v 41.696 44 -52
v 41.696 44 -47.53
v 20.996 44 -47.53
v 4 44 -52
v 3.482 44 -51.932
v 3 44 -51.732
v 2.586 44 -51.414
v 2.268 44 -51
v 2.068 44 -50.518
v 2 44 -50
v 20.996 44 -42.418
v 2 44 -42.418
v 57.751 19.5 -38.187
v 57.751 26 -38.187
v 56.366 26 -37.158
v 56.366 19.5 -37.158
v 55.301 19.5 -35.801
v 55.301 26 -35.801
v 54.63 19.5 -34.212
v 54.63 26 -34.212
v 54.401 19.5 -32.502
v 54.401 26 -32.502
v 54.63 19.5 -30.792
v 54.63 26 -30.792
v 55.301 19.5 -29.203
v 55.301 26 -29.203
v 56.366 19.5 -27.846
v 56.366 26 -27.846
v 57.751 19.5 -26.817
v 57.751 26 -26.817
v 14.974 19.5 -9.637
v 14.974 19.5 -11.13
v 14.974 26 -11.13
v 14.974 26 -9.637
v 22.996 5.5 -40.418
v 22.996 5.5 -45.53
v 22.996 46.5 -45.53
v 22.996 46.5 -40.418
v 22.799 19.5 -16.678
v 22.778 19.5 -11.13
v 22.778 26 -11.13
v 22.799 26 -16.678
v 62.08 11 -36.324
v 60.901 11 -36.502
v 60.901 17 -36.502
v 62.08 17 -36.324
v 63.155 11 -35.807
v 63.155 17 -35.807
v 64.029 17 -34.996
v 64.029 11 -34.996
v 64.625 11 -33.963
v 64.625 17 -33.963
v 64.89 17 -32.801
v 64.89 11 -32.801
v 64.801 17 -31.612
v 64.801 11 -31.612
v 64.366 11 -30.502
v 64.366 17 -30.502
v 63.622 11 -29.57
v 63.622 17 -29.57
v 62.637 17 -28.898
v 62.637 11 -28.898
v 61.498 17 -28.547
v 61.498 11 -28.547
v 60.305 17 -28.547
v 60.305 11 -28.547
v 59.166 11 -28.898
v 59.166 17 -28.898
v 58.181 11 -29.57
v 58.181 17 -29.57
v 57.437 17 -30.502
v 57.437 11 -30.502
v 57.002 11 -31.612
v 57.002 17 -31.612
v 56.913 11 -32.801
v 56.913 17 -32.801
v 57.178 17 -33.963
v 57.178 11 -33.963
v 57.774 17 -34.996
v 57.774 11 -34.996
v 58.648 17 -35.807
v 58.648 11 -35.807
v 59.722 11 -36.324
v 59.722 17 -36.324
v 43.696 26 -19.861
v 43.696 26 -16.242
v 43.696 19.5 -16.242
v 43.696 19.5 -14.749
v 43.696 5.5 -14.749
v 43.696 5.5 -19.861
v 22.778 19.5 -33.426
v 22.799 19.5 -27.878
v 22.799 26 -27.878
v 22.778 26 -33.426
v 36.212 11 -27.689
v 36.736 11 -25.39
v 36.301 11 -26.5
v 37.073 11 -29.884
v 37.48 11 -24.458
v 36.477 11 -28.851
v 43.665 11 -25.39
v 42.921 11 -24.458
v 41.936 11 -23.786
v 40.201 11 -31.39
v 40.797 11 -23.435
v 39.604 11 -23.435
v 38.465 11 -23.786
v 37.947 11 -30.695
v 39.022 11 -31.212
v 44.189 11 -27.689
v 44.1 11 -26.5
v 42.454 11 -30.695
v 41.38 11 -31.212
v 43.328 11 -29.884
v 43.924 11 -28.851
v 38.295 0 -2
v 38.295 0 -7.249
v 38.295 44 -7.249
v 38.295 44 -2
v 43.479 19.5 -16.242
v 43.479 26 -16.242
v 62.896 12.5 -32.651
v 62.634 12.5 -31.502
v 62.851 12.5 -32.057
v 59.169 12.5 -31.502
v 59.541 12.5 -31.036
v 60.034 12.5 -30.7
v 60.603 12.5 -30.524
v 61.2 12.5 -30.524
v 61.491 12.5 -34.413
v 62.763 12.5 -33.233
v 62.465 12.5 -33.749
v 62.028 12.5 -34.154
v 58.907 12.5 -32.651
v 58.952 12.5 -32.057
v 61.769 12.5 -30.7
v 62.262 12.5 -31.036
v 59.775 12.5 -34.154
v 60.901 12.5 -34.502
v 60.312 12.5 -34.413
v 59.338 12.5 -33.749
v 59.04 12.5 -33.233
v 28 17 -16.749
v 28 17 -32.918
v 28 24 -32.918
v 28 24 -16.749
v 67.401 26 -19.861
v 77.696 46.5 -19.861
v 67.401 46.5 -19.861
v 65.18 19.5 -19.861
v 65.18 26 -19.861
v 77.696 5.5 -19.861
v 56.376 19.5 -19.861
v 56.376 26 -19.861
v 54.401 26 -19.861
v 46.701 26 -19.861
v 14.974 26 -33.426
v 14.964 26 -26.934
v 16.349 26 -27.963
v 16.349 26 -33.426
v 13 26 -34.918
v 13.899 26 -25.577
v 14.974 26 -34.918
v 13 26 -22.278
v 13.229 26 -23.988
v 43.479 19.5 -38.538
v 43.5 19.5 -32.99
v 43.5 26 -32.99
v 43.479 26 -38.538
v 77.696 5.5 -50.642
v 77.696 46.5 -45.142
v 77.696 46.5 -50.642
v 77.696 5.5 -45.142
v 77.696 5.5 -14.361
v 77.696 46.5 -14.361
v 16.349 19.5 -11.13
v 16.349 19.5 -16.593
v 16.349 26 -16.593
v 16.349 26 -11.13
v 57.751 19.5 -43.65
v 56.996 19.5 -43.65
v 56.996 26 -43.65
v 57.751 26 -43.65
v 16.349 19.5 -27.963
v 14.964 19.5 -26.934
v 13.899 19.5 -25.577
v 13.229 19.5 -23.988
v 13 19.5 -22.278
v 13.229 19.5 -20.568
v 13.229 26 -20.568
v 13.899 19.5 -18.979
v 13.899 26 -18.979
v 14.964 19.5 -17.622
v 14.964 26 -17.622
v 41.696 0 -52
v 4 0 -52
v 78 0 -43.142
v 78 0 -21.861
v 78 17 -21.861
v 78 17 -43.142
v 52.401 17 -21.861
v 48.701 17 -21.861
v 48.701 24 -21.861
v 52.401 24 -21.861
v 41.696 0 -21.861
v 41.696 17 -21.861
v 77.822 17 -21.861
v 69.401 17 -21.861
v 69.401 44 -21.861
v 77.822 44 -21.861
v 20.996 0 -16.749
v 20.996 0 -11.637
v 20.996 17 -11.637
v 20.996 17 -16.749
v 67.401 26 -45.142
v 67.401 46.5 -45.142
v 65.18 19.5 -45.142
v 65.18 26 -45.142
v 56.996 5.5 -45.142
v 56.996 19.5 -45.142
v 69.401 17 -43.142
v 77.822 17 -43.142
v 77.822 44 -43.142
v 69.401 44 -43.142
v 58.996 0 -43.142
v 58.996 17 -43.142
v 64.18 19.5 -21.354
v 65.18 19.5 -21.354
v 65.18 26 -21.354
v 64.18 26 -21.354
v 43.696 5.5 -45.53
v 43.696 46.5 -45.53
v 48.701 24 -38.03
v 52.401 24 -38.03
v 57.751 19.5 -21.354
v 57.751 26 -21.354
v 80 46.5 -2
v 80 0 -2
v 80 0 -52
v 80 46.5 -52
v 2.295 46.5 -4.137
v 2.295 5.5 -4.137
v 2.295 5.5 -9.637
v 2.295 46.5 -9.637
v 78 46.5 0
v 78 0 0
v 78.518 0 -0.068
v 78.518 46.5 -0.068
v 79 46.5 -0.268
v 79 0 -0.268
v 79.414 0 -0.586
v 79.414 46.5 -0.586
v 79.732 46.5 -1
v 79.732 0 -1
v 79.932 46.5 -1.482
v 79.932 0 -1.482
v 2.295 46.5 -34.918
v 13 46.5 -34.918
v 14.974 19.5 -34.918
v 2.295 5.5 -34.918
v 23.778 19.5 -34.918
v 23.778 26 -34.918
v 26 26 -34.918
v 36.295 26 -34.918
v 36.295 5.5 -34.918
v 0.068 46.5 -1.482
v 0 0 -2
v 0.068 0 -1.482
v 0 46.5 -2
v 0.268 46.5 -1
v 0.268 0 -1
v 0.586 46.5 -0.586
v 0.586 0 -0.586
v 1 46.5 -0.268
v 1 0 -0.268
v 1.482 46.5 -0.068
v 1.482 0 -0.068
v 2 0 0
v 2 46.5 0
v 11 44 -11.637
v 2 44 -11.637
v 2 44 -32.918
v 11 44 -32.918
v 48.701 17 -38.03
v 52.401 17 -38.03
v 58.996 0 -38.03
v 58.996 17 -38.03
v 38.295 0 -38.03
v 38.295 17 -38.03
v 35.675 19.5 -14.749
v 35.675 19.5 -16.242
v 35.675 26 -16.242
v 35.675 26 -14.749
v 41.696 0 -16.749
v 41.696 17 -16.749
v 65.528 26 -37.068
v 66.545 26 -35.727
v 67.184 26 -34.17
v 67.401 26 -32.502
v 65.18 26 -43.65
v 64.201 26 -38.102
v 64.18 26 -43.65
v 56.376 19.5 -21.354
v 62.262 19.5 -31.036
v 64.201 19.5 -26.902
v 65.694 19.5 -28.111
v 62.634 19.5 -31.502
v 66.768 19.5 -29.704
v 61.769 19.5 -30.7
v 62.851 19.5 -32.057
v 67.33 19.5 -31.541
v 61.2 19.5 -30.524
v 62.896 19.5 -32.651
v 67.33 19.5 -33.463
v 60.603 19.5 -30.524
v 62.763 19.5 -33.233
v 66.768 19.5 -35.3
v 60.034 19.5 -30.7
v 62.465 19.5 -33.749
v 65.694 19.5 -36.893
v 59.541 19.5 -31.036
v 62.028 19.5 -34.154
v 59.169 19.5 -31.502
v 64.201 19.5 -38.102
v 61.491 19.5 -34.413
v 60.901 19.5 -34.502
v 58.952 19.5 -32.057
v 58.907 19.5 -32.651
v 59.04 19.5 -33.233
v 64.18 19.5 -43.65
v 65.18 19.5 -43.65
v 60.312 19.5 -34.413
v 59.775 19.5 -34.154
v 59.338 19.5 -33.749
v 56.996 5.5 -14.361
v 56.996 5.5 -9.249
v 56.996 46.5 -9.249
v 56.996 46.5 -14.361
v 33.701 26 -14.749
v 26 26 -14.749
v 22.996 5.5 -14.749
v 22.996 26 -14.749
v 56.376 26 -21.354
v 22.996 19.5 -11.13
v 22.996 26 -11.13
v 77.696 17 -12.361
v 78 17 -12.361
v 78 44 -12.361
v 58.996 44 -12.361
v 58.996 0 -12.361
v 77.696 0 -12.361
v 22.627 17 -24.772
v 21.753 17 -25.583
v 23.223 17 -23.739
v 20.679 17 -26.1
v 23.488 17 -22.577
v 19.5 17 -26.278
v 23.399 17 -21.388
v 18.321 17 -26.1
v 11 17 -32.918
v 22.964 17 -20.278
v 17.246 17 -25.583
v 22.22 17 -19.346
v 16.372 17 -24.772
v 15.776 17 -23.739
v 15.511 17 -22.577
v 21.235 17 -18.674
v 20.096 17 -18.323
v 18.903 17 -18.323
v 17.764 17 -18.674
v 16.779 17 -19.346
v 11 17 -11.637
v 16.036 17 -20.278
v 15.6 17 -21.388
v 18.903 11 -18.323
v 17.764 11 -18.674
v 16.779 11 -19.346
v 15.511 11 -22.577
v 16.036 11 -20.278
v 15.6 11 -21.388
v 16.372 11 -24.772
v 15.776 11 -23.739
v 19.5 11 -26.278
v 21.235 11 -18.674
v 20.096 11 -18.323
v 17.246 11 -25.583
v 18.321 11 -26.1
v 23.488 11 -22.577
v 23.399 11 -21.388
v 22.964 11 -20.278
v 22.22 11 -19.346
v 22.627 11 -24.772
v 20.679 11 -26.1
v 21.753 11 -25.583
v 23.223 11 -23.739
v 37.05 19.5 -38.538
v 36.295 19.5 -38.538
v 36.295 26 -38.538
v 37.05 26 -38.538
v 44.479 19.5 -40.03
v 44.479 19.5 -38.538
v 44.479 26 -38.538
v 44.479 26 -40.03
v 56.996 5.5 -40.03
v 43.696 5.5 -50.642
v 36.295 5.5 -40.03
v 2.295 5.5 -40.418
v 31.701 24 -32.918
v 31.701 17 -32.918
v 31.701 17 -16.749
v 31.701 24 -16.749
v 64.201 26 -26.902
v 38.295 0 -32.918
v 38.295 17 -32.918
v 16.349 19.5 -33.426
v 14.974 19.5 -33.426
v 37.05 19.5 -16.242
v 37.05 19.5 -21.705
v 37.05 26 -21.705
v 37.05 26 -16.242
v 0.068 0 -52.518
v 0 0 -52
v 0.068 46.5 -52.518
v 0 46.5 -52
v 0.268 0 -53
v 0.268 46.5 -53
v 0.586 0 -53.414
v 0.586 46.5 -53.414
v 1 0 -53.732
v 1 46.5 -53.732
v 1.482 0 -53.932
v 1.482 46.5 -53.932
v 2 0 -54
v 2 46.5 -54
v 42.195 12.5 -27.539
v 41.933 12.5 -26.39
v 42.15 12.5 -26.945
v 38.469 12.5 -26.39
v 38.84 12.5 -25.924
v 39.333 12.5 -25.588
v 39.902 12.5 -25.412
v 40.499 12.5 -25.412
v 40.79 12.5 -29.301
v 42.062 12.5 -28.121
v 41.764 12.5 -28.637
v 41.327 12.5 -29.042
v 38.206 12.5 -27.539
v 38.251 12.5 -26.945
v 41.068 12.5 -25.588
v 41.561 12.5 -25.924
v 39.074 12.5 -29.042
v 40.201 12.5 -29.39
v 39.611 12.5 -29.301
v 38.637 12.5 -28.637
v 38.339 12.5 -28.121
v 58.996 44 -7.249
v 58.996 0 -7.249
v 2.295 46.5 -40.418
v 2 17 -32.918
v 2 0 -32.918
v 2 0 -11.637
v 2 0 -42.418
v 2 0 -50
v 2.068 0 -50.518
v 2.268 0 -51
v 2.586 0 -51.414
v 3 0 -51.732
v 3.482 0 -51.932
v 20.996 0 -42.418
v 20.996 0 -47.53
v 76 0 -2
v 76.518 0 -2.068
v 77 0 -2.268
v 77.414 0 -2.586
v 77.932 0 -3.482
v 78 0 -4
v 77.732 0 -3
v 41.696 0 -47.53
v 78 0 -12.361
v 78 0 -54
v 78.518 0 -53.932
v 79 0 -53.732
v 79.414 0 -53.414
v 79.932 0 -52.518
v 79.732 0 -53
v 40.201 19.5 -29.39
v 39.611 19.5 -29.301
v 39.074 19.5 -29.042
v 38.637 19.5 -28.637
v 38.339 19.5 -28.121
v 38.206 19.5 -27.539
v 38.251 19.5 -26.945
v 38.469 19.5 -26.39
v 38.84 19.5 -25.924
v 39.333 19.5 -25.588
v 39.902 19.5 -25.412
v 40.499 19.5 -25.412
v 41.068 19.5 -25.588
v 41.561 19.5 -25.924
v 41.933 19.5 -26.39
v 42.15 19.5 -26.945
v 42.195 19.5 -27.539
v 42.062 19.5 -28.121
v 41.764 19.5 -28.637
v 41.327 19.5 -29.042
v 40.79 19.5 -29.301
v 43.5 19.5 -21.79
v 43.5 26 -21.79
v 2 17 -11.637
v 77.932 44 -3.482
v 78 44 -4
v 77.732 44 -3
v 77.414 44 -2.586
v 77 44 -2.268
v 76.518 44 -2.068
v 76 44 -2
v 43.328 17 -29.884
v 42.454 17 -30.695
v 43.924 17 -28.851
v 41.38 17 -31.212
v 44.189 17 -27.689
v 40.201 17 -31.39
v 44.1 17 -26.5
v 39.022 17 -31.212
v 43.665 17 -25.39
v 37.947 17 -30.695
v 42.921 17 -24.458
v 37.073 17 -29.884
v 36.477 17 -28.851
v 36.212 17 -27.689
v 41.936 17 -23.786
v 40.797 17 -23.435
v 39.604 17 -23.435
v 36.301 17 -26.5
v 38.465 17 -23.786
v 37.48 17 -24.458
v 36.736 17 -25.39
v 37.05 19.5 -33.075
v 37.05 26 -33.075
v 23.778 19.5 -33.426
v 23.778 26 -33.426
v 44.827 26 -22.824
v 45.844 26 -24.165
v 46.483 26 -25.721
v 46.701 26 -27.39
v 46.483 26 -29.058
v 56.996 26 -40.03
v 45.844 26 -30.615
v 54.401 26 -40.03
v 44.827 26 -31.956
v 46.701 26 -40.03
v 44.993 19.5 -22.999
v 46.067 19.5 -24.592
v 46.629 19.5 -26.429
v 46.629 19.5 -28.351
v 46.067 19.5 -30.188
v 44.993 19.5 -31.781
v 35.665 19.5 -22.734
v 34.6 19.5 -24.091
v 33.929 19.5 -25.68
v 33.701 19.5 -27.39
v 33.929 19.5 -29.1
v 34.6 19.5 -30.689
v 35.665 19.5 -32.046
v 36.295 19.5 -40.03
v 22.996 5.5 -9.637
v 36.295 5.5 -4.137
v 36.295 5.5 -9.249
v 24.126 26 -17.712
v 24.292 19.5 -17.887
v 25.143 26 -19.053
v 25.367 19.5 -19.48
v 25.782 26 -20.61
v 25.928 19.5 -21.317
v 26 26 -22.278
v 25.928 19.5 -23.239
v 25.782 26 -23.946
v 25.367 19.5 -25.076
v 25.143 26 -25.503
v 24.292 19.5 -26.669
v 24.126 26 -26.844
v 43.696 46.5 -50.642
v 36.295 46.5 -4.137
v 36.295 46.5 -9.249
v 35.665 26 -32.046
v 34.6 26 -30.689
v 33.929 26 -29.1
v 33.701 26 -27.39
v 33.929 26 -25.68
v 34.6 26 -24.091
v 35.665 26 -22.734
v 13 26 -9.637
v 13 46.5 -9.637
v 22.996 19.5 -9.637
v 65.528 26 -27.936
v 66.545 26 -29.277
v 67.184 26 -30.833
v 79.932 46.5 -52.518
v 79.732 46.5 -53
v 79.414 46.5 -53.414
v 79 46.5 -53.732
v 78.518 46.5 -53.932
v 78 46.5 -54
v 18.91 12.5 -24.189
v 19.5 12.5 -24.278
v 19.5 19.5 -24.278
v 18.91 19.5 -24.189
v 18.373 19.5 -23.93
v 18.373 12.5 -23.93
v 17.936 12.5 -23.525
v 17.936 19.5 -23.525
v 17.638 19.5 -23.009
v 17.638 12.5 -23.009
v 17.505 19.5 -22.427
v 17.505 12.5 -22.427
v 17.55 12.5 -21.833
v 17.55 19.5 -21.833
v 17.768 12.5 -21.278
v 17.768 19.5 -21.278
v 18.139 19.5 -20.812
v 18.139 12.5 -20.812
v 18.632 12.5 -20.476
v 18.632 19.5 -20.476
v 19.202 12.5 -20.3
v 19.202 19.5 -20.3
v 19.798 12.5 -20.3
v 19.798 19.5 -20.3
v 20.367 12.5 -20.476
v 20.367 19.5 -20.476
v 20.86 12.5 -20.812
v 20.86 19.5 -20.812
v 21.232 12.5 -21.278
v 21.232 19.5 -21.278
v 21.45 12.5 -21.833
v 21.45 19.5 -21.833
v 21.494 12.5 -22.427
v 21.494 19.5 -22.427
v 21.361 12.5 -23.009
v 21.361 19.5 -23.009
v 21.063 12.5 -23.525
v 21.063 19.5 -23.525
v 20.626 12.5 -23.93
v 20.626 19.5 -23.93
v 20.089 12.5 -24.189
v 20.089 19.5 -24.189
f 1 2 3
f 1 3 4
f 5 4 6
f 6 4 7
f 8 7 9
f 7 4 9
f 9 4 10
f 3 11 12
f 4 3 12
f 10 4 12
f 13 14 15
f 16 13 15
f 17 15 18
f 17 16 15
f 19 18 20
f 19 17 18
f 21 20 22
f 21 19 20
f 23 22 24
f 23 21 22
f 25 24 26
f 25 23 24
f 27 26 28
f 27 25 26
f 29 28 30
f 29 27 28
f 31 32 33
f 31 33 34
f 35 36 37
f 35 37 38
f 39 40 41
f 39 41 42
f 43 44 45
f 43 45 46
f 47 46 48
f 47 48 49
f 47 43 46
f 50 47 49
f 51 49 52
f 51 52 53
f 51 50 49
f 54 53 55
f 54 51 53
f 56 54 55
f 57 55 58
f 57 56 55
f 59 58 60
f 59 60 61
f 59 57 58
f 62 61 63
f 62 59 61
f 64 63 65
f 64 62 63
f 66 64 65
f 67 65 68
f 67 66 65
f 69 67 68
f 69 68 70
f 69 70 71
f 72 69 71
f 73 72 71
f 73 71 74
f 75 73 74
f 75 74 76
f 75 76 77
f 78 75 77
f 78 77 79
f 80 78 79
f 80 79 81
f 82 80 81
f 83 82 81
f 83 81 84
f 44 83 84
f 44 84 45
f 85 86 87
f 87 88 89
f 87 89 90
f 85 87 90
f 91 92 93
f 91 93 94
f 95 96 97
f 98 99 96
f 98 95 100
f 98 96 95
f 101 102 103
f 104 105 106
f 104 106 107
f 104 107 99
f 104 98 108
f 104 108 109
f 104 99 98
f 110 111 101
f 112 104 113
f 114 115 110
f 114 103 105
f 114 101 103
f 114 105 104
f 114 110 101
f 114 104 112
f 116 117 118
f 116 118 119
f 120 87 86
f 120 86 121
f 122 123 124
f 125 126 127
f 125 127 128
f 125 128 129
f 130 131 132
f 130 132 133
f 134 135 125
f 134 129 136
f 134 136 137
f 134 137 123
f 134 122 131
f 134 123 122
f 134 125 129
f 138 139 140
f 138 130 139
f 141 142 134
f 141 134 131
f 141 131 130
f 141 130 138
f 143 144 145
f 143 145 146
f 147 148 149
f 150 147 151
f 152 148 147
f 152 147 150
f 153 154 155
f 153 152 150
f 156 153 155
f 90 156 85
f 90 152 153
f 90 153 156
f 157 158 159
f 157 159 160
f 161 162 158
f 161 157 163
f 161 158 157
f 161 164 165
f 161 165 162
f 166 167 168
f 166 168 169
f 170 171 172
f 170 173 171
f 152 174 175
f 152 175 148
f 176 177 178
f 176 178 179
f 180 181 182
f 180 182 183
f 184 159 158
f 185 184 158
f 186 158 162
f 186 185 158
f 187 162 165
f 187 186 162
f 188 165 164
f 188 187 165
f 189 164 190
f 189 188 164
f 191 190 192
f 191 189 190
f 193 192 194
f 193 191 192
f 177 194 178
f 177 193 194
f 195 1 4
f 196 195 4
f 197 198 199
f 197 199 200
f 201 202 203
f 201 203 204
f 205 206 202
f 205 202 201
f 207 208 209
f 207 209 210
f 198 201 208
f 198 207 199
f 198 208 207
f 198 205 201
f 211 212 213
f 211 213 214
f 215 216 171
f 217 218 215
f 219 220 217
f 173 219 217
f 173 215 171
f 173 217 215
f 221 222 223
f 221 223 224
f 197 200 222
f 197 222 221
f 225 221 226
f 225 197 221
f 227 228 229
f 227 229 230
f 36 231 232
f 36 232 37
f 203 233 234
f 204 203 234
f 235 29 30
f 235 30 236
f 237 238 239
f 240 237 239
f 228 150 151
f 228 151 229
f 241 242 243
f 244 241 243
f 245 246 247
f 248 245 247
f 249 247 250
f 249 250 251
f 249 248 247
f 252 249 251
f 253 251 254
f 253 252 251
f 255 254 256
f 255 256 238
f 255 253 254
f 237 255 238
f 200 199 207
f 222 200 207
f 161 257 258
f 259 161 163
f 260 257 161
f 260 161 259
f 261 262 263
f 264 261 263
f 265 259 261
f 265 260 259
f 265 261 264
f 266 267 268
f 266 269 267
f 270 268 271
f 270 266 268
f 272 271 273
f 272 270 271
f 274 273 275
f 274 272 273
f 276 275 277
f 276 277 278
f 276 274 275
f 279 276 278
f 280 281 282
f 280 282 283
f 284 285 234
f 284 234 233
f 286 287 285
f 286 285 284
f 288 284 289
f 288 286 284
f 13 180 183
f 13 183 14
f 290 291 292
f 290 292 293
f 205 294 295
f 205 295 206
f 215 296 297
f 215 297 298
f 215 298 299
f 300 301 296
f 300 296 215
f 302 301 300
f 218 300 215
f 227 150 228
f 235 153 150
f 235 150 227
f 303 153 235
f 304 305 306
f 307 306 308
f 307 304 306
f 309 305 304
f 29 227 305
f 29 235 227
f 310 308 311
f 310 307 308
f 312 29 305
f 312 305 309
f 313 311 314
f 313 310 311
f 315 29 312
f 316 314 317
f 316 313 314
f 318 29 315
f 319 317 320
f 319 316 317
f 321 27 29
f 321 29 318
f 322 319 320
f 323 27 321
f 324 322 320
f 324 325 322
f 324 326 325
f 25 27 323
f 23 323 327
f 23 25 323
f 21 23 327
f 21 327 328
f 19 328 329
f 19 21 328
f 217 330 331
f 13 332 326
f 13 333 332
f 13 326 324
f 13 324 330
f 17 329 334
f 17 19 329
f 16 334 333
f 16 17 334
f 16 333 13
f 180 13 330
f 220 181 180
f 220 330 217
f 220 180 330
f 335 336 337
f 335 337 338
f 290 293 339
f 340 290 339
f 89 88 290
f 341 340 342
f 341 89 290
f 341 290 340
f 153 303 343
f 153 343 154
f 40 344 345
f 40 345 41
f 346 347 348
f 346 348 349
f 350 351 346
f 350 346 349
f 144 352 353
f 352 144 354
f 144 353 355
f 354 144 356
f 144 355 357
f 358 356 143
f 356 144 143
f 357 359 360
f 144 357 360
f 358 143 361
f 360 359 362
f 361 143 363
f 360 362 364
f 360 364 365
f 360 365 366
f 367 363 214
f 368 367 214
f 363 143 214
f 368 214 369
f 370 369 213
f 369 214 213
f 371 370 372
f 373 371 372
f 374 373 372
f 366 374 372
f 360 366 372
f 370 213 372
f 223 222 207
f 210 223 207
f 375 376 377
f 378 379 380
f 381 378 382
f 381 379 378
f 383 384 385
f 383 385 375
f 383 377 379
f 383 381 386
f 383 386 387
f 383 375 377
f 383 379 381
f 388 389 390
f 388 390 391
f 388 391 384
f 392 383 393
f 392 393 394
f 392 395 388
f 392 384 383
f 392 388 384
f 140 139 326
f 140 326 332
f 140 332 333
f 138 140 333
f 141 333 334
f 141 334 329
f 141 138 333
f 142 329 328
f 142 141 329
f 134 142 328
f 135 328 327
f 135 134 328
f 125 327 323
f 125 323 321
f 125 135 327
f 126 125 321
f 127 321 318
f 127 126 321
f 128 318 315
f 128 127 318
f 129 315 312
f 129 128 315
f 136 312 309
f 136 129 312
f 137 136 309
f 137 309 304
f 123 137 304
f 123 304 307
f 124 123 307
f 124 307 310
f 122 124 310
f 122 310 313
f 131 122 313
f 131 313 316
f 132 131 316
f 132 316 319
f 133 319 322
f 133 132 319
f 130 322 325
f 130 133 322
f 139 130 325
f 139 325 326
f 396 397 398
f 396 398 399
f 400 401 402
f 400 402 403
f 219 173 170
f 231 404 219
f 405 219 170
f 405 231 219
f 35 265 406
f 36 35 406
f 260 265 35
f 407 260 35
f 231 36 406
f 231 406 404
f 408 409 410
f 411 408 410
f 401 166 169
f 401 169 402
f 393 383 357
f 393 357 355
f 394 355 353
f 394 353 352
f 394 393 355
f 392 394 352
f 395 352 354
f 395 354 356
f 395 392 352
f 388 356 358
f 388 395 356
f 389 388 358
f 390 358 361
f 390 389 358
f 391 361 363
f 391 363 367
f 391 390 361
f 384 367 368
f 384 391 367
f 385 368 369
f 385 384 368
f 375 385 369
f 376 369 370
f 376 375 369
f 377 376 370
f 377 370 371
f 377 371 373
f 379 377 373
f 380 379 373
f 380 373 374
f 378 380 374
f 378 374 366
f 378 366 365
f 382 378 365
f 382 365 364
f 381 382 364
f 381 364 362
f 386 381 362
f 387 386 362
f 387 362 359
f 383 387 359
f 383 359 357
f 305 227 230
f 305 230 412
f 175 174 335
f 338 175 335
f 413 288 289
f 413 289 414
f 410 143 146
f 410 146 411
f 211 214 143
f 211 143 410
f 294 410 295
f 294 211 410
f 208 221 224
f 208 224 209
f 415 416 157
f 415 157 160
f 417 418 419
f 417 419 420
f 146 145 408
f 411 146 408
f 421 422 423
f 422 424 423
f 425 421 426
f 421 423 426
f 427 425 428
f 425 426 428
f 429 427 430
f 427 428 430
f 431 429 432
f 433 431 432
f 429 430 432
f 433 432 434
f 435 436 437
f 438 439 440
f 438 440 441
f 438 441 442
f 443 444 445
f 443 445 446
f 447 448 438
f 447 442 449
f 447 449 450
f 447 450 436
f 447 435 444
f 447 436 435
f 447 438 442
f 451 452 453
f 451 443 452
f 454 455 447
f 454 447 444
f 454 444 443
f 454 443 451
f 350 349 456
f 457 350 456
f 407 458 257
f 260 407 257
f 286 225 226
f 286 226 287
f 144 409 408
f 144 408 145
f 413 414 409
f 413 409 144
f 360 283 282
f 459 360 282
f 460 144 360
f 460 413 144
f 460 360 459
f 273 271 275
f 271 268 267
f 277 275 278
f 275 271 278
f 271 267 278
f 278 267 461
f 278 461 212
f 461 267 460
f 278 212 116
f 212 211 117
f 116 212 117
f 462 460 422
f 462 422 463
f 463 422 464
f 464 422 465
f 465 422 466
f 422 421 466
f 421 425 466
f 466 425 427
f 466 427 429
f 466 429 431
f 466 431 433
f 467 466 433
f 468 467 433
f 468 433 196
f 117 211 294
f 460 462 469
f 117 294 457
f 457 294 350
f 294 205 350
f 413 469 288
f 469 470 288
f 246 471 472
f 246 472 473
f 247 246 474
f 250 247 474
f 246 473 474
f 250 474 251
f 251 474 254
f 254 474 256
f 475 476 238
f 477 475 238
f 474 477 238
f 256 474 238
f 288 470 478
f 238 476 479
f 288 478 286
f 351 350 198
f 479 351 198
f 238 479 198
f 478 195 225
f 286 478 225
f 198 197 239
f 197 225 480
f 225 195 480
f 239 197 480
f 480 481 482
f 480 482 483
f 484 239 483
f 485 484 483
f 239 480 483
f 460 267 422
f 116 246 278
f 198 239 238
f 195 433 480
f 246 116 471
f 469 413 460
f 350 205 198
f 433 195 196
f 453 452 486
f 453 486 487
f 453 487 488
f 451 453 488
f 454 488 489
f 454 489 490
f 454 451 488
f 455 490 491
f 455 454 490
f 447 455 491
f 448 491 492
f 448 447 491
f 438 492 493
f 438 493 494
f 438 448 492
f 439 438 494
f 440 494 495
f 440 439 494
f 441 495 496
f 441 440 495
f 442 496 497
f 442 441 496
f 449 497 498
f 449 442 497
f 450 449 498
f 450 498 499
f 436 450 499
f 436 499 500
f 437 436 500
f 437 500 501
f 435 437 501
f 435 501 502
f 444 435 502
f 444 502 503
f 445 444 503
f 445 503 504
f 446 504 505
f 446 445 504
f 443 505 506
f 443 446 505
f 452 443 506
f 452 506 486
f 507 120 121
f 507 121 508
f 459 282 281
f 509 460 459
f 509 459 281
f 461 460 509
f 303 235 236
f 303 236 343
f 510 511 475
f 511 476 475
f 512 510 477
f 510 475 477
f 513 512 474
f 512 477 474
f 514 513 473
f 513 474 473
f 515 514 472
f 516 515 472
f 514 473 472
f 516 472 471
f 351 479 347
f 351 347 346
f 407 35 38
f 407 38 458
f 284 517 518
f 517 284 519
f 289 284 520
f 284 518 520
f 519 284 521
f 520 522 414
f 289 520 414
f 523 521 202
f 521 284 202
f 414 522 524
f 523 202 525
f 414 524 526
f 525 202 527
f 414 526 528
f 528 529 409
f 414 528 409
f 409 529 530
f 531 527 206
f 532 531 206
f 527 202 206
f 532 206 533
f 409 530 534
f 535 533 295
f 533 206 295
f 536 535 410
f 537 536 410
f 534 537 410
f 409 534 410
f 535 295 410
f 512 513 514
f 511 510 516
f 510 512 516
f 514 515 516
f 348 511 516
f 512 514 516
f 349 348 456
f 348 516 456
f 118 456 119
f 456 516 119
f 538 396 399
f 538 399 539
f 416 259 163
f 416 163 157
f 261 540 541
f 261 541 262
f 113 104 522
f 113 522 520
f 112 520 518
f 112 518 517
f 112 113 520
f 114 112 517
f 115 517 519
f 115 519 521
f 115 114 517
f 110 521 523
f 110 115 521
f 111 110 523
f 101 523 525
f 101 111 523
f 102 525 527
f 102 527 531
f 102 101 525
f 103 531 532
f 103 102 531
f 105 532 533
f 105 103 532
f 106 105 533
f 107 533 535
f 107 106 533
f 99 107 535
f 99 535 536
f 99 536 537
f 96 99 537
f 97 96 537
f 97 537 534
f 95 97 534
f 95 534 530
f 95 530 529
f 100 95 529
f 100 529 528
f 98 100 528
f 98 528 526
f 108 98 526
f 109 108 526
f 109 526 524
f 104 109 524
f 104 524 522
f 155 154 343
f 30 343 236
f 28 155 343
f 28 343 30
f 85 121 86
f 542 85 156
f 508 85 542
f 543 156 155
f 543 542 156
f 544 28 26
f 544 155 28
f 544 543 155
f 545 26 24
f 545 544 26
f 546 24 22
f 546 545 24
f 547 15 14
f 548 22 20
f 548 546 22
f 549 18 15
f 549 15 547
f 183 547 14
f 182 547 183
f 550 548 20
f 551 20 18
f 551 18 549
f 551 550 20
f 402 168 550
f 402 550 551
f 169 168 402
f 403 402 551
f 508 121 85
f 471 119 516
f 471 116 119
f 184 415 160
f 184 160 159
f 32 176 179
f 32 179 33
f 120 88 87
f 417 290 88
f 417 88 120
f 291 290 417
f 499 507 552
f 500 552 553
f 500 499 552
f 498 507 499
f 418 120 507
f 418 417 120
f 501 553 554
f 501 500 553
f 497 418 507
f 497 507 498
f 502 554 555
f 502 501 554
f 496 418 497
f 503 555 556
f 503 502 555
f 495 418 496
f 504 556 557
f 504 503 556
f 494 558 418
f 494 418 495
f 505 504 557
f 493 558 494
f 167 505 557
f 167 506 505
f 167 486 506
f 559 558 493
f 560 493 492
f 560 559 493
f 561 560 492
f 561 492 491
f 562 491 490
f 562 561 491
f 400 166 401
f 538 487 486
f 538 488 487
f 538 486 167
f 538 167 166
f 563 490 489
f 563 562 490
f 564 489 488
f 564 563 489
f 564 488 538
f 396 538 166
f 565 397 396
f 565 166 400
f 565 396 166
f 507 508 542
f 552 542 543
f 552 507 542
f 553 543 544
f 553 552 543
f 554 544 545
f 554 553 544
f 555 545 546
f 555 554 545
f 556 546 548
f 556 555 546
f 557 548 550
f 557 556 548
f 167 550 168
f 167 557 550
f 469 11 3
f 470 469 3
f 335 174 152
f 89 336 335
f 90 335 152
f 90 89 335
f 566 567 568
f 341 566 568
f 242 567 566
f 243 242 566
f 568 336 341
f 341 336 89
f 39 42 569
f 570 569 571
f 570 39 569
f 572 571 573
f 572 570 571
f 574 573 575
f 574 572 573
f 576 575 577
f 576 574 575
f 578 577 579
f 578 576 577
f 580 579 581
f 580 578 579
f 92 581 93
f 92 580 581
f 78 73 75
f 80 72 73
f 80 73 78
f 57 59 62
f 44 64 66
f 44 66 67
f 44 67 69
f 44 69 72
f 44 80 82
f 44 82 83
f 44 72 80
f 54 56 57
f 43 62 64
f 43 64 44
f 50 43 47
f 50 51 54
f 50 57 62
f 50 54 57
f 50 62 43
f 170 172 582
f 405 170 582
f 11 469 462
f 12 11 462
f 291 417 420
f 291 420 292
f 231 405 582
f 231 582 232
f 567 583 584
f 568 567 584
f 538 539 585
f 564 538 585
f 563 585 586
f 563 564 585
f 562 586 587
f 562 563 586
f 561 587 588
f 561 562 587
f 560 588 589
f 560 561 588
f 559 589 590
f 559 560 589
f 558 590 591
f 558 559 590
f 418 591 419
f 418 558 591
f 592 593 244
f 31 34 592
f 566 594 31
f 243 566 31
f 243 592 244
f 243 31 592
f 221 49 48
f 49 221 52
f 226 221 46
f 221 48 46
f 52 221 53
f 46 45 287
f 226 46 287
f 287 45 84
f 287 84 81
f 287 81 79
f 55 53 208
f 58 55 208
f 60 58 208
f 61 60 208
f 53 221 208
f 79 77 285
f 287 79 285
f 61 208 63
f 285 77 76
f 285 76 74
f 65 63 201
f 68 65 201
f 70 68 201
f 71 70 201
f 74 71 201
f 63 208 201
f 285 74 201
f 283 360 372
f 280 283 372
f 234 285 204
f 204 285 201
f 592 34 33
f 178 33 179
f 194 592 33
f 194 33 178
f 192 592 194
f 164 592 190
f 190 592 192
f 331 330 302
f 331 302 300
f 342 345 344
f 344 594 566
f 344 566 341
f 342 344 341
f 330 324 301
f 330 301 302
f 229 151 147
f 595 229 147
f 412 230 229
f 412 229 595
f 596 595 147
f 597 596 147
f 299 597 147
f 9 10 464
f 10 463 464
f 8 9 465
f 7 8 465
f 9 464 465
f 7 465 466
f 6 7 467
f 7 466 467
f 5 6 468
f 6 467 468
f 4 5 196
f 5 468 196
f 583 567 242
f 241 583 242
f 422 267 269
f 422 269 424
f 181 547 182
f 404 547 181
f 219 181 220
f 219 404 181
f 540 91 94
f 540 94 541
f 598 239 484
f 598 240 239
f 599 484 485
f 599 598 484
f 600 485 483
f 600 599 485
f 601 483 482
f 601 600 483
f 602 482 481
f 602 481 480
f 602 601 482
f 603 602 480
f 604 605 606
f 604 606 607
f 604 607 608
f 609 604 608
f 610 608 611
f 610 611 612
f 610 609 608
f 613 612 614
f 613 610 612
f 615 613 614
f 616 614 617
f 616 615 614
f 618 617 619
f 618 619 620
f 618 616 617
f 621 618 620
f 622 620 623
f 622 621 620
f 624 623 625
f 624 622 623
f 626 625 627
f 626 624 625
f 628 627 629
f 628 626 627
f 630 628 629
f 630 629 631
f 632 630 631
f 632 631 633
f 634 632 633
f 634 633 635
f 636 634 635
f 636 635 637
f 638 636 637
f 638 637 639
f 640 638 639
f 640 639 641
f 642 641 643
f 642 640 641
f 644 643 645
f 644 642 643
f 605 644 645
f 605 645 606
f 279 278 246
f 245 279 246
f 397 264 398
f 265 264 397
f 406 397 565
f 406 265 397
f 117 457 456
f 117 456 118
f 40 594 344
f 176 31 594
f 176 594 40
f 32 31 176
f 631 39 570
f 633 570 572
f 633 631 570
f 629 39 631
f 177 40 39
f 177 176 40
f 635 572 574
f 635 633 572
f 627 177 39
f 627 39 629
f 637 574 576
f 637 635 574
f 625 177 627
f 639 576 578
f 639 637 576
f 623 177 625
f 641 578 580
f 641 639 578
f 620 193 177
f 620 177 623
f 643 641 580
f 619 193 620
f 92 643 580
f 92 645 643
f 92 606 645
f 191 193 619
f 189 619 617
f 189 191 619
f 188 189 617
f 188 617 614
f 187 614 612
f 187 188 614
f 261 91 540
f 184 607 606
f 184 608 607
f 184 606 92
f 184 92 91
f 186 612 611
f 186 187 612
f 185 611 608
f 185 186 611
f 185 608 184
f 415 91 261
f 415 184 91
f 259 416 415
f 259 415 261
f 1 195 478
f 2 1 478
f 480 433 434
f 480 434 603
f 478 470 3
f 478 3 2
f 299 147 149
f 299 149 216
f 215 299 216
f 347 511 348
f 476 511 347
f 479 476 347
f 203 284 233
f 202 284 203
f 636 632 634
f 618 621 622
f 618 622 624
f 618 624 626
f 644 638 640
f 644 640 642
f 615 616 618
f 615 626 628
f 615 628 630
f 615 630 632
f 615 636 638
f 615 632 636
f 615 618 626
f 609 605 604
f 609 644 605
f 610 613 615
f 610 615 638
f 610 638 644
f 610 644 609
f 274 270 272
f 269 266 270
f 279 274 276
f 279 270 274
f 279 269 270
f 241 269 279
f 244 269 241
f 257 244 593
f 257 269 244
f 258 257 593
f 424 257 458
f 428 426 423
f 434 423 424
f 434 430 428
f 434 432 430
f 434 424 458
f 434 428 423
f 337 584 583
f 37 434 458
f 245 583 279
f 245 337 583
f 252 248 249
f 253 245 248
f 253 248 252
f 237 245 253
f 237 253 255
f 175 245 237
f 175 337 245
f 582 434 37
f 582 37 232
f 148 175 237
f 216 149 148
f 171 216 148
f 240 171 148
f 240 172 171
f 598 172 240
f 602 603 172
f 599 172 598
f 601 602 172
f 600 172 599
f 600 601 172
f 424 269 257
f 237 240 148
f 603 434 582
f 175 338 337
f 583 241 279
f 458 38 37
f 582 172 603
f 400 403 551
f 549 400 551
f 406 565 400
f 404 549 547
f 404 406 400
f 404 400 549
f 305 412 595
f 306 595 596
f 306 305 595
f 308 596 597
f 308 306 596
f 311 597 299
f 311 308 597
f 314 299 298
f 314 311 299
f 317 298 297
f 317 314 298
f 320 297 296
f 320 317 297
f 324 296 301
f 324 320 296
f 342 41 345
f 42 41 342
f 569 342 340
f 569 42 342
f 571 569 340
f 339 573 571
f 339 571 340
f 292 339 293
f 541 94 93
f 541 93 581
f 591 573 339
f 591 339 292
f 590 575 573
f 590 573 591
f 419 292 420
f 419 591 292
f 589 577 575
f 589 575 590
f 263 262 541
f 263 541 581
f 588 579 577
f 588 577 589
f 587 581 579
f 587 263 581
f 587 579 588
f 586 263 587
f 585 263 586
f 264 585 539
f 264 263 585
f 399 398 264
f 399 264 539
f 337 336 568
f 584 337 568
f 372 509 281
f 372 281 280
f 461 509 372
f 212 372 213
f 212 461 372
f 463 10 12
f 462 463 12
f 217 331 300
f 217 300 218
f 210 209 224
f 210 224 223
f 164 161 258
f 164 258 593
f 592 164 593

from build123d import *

# Parameters (mm, degrees)
SKETCH1_W                                 = 80
SKETCH1_H                                 = 54
BOSS_EXTRUDE2_DEPTH                       = 46.5
FILLET1_R                                 = 2
TIE_START                                 = 17.648406802
TIE_FIGHTER_LAYING_DOWN_BLANK_DEPTH       = 27
TIE_START_2                               = 3.648406802
TIE_FIGHTER_LAYING_DOWN_BLANK_2_OUTLINE_W = 5.5
TIE_FIGHTER_LAYING_DOWN_BLANK_2_OUTLINE_H = 34
TIE_FIGHTER_LAYING_DOWN_BLANK_2_DEPTH     = 14
TIE_START_3                               = 24.148406802
TIE_FIGHTER_LAYING_DOWN_BLANK_3_DEPTH     = 20.5
TIE_START_4                               = 10.648406802
TIE_FIGHTER_LAYING_DOWN_BLANK_4_OUTLINE_R = 2
TIE_FIGHTER_LAYING_DOWN_BLANK_4_DEPTH     = 7
BODY_MOVE_COPY3_ANGLE                     = 90
SKETCH2_W                                 = 7.700906033
SKETCH2_H                                 = 20.169020688
SKETCH2_W_2                               = 7.700906032
CUT_EXTRUDE1_DEPTH                        = 30
SKETCH3_R                                 = 4
CUT_EXTRUDE2_DEPTH                        = 17
SKETCH4_W                                 = 3.700906032
SKETCH4_H                                 = 16.169020688
SKETCH4_W_2                               = 8.420251913
SKETCH4_H_2                               = 21.281008515
SKETCH4_W_3                               = 8.999653324
SKETCH4_W_4                               = 3.700906033
CUT_EXTRUDE3_DEPTH                        = 27
FILLET2_R                                 = 2
SKETCH5_W                                 = 3.700906033
SKETCH5_H                                 = 16.169020688
SKETCH5_W_2                               = 3.700906032
BOSS_EXTRUDE3_DEPTH                       = 2
SKETCH6_R                                 = 4
CUT_EXTRUDE4_DEPTH                        = 11


with BuildPart() as part:
    # Sketch1 → Boss-Extrude2 (new body)
    with BuildSketch(Plane(origin=(0, 0, 0), x_dir=(1, 0, 0), z_dir=(0, 1, 0))):
        with Locations((40, 27)):
            Rectangle(SKETCH1_W, SKETCH1_H)
    extrude(amount=BOSS_EXTRUDE2_DEPTH)

    # Fillet1
    fillet1_edges = [part.edges().sort_by_distance(p)[0] for p in [
        (0, 23.25, -54),
        (80, 23.25, -54),
        (80, 23.25, 0),
        (0, 23.25, 0),
    ]]
    fillet(fillet1_edges, radius=FILLET1_R)


with BuildPart() as body_2:
    # Tie Fighter Laying Down Blank: read off the stored shape, not the designer's step
    # Tie Fighter Laying Down Blank outline → Tie Fighter Laying Down Blank (new body)
    with BuildSketch(Plane(origin=(0, 0, 0), x_dir=(1, 0, 0), z_dir=(0, 1, 0)).offset(TIE_START)):
        with BuildLine():
            Line((-37.161017612, 22.550360254), (-37.161017612, 23.550360254))
            Line((-37.161017612, 23.550360254), (-31.61325597, 23.529243987))
            ThreePointArc((-31.61325597, 23.529243987), (-26.013035095, 20.32886914), (-20.412814219, 23.529243987))
            Line((-20.412814219, 23.529243987), (-14.865052577, 23.550360254))
            Line((-14.865052577, 23.550360254), (-14.865052577, 22.550360254))
            Line((-14.865052577, 22.550360254), (-13.372530837, 22.550360254))
            Line((-13.372530837, 22.550360254), (-13.372530837, 10.033920638))
            Line((-13.372530837, 10.033920638), (-7.872530837, 10.033920638))
            Line((-7.872530837, 10.033920638), (-7.872530837, 44.033920638))
            Line((-7.872530837, 44.033920638), (-13.372530837, 44.033920638))
            Line((-13.372530837, 44.033920638), (-13.372530837, 31.354739987))
            Line((-13.372530837, 31.354739987), (-14.865052577, 31.354739987))
            Line((-14.865052577, 31.354739987), (-14.865052577, 29.979499621))
            Line((-14.865052577, 29.979499621), (-20.327656693, 29.979499621))
            ThreePointArc((-20.327656693, 29.979499621), (-26.013035095, 33.32886914), (-31.698413496, 29.979499621))
            Line((-31.698413496, 29.979499621), (-37.161017612, 29.979499621))
            Line((-37.161017612, 29.979499621), (-37.161017612, 31.354739987))
            Line((-37.161017612, 31.354739987), (-38.653539352, 31.354739987))
            Line((-38.653539352, 31.354739987), (-38.653539352, 44.033920638))
            Line((-38.653539352, 44.033920638), (-44.153539352, 44.033920638))
            Line((-44.153539352, 44.033920638), (-44.153539352, 10.033920638))
            Line((-44.153539352, 10.033920638), (-38.653539352, 10.033920638))
            Line((-38.653539352, 10.033920638), (-38.653539352, 22.550360254))
            Line((-38.653539352, 22.550360254), (-37.161017612, 22.550360254))
        make_face()
    extrude(amount=TIE_FIGHTER_LAYING_DOWN_BLANK_DEPTH)

    # Tie Fighter Laying Down Blank 2 outline → Tie Fighter Laying Down Blank 2 (add)
    with BuildSketch(Plane(origin=(0, 0, 0), x_dir=(1, 0, 0), z_dir=(0, 1, 0)).offset(TIE_START_2)):
        with Locations((-41.403539352, 27.033920638)):
            Rectangle(TIE_FIGHTER_LAYING_DOWN_BLANK_2_OUTLINE_W, TIE_FIGHTER_LAYING_DOWN_BLANK_2_OUTLINE_H)
        with Locations((-10.622530837, 27.033920638)):
            Rectangle(TIE_FIGHTER_LAYING_DOWN_BLANK_2_OUTLINE_W, TIE_FIGHTER_LAYING_DOWN_BLANK_2_OUTLINE_H)
    extrude(amount=TIE_FIGHTER_LAYING_DOWN_BLANK_2_DEPTH)

    # Tie Fighter Laying Down Blank 3 outline → Tie Fighter Laying Down Blank 3 (add)
    with BuildSketch(Plane(origin=(0, 0, 0), x_dir=(1, 0, 0), z_dir=(0, 1, 0)).offset(TIE_START_3)):
        with BuildLine():
            Line((-31.61325597, 23.529243987), (-37.161017612, 23.550360254))
            Line((-37.161017612, 23.550360254), (-37.161017612, 22.550360254))
            Line((-37.161017612, 22.550360254), (-38.653539352, 22.550360254))
            Line((-38.653539352, 22.550360254), (-38.653539352, 20.32886914))
            Line((-38.653539352, 20.32886914), (-26.013035094, 20.32886914))
            ThreePointArc((-26.013035094, 20.32886914), (-29.238127071, 21.18539665), (-31.61325597, 23.529243987))
        make_face()
        with BuildLine():
            ThreePointArc((-20.412814219, 23.529243987), (-22.787943118, 21.18539665), (-26.013035094, 20.32886914))
            Line((-26.013035094, 20.32886914), (-13.372530837, 20.32886914))
            Line((-13.372530837, 20.32886914), (-13.372530837, 22.550360254))
            Line((-13.372530837, 22.550360254), (-14.865052577, 22.550360254))
            Line((-14.865052577, 22.550360254), (-14.865052577, 23.550360254))
            Line((-14.865052577, 23.550360254), (-20.412814219, 23.529243987))
        make_face()
        with BuildLine():
            Line((-38.653539352, 33.32886914), (-38.653539352, 31.354739987))
            Line((-38.653539352, 31.354739987), (-37.161017612, 31.354739987))
            Line((-37.161017612, 31.354739987), (-37.161017612, 29.979499621))
            Line((-37.161017612, 29.979499621), (-31.698413496, 29.979499621))
            ThreePointArc((-31.698413496, 29.979499621), (-29.31234577, 32.429275292), (-26.013035095, 33.32886914))
            Line((-26.013035095, 33.32886914), (-38.653539352, 33.32886914))
        make_face()
        with BuildLine():
            Line((-13.372530837, 33.32886914), (-26.013035095, 33.32886914))
            ThreePointArc((-26.013035095, 33.32886914), (-22.713724419, 32.429275292), (-20.327656693, 29.979499621))
            Line((-20.327656693, 29.979499621), (-14.865052577, 29.979499621))
            Line((-14.865052577, 29.979499621), (-14.865052577, 31.354739987))
            Line((-14.865052577, 31.354739987), (-13.372530837, 31.354739987))
            Line((-13.372530837, 31.354739987), (-13.372530837, 33.32886914))
        make_face()
    extrude(amount=TIE_FIGHTER_LAYING_DOWN_BLANK_3_DEPTH)

    # Tie Fighter Laying Down Blank 4 outline → Tie Fighter Laying Down Blank 4 (add)
    with BuildSketch(Plane(origin=(0, 0, 0), x_dir=(1, 0, 0), z_dir=(0, 1, 0)).offset(TIE_START_4)):
        with Locations((-26.013035095, 26.82886914)):
            Circle(TIE_FIGHTER_LAYING_DOWN_BLANK_4_OUTLINE_R)
    extrude(amount=TIE_FIGHTER_LAYING_DOWN_BLANK_4_DEPTH)


with BuildPart() as body_2_1:
    # Body-Move/Copy2: read off the stored shape, not the designer's step
    # Body-Move/Copy2: moved
    add(body_2.part.moved(Location((0, 1.8515932, 0))))


with BuildPart() as body_2_2:
    # Body-Move/Copy3: moved
    add(body_2_1.part.rotate(Axis((-26.013075057, 0, -27.033920638), (0, 1, 0)), BODY_MOVE_COPY3_ANGLE))


with BuildPart() as body_2_3:
    # Body-Move/Copy4: moved
    add(body_2_2.part.moved(Location((45.307676883, 0, 6.774371597))))


with BuildPart() as body_3:
    # Body-Move/Copy6: read off the stored shape, not the designer's step
    # Body-Move/Copy6: copy of body 2
    add(body_2_3.part.moved(Location((41.4018121, 0, -10.2239757))))


with BuildPart() as body_4:
    # Body-Move_Copy6 2: copy of body 2
    add(body_2_3.part.moved(Location((20.700906, 0, -5.1119878))))


with BuildPart() as body_3_1:
    # Body-Move/Copy7: read off the stored shape, not the designer's step
    # Body-Move/Copy7: moved
    add(body_3.part.moved(Location((0, 0, -2.018363))))


with BuildPart() as body_4_1:
    # Body-Move_Copy7 2: moved
    add(body_4.part.moved(Location((0, 0, -2.018363))))


with BuildPart() as body_2_4:
    # Body-Move_Copy7 3: moved
    add(body_2_3.part.moved(Location((0, 0, -2.018363))))


with BuildPart() as part_1:
    add(part.part)

    # Intersect1: read off the stored shape, not the designer's step
    # Intersect1: cut body 3, body 4, body 2
    add(body_3_1.part, mode=Mode.SUBTRACT)
    add(body_4_1.part, mode=Mode.SUBTRACT)
    add(body_2_4.part, mode=Mode.SUBTRACT)

    # Sketch2 → Cut-Extrude1 (cut)
    with BuildSketch(Plane(origin=(0, 26, 0), x_dir=(1, 0, 0), z_dir=(0, 1, 0))):
        with Locations((29.850106341, 24.833945924)):
            Rectangle(SKETCH2_W, SKETCH2_H)
        with Locations((50.551012373, 29.945933752)):
            Rectangle(SKETCH2_W_2, SKETCH2_H)
    extrude(amount=CUT_EXTRUDE1_DEPTH, mode=Mode.SUBTRACT)

    # Sketch3 → Cut-Extrude2 (cut)
    # profile 1 of 3: a face of its own
    with BuildSketch(Plane.XZ):
        Polygon((38.294601826, -32.918456268), (2, -32.918456268), (2, -11.637447753), (20.995507859, -11.637447753), (20.995507859, -16.74943558), (41.696413892, -16.74943558), (41.696413892, -21.861423408), (78, -21.861423408), (78, -43.142431923), (58.995507859, -43.142431923), (58.995507859, -38.030444096), (38.294601826, -38.030444096), align=None)
        with Locations(Location((60.901465389, -32.501927666, 0), (0, 0, 270))):
            Circle(SKETCH3_R, mode=Mode.SUBTRACT)
        with Locations(Location((40.200559357, -27.389939838, 0), (0, 0, 270))):
            Circle(SKETCH3_R, mode=Mode.SUBTRACT)
        with Locations(Location((19.499653324, -22.277952011, 0), (0, 0, 270))):
            Circle(SKETCH3_R, mode=Mode.SUBTRACT)
    # profile 2 of 3: a face of its own
    with BuildSketch(Plane.XZ):
        Polygon((2.294601826, -42.418456268), (20.995507859, -42.418456268), (20.995507859, -47.530444096), (41.696413892, -47.530444096), (41.696413892, -50.642391961), (41.696413892, -52), (2, -52), (2, -42.418456268), align=None)
    # profile 3 of 3: a face of its own
    with BuildSketch(Plane.XZ):
        Polygon((77.696413892, -12.361423408), (58.995507859, -12.361423408), (58.995507859, -7.24943558), (38.294601826, -7.24943558), (38.294601826, -2), (78, -2), (78, -12.361383446), align=None)
    extrude(amount=-CUT_EXTRUDE2_DEPTH, mode=Mode.SUBTRACT)

    # Sketch4 → Cut-Extrude3 (cut)
    with BuildSketch(Plane.XZ.offset(-17)):
        Polygon((78, -12.361423408), (58.995507859, -12.361423408), (58.995507859, -7.24943558), (38.294601826, -7.24943558), (38.294601826, -2), (58.995507859, -2), (78, -2), align=None)
        Polygon((2, -42.418456268), (20.995507859, -42.418456268), (20.995507859, -47.530444096), (41.696413892, -47.530444096), (41.696413892, -52), (20.995507859, -52), (2, -52), align=None)
        with Locations((50.551012373, -29.945933752)):
            Rectangle(SKETCH4_W, SKETCH4_H)
        with Locations((73.611591346, -32.501927666)):
            Rectangle(SKETCH4_W_2, SKETCH4_H_2)
        with Locations((6.499826662, -22.277952011)):
            Rectangle(SKETCH4_W_3, SKETCH4_H_2)
        with Locations((29.850106341, -24.833945924)):
            Rectangle(SKETCH4_W_4, SKETCH4_H)
    extrude(amount=-CUT_EXTRUDE3_DEPTH, mode=Mode.SUBTRACT)

    # Fillet2
    fillet2_edges = [part_1.edges().sort_by_distance(p)[0] for p in [
        (2, 22, -52),
        (78, 22, -2),
    ]]
    fillet(fillet2_edges, radius=FILLET2_R)

    # Sketch5 → Boss-Extrude3 (add)
    with BuildSketch(Plane(origin=(0, 26, 0), x_dir=(1, 0, 0), z_dir=(0, 1, 0))):
        with Locations((29.850106341, 24.833945924)):
            Rectangle(SKETCH5_W, SKETCH5_H)
        with Locations((50.551012373, 29.945933752)):
            Rectangle(SKETCH5_W_2, SKETCH5_H)
    extrude(amount=-BOSS_EXTRUDE3_DEPTH)

    # Sketch6 → Cut-Extrude4 (cut)
    with BuildSketch(Plane.XZ):
        with Locations(Location((19.499653324, -22.277952011, 0), (0, 0, 270))):
            Circle(SKETCH6_R)
        with Locations(Location((40.200559357, -27.389939838, 0), (0, 0, 270))):
            Circle(SKETCH6_R)
        with Locations(Location((60.901465389, -32.501927666, 0), (0, 0, 270))):
            Circle(SKETCH6_R)
    extrude(amount=-CUT_EXTRUDE4_DEPTH, mode=Mode.SUBTRACT)


solid = part_1.part
